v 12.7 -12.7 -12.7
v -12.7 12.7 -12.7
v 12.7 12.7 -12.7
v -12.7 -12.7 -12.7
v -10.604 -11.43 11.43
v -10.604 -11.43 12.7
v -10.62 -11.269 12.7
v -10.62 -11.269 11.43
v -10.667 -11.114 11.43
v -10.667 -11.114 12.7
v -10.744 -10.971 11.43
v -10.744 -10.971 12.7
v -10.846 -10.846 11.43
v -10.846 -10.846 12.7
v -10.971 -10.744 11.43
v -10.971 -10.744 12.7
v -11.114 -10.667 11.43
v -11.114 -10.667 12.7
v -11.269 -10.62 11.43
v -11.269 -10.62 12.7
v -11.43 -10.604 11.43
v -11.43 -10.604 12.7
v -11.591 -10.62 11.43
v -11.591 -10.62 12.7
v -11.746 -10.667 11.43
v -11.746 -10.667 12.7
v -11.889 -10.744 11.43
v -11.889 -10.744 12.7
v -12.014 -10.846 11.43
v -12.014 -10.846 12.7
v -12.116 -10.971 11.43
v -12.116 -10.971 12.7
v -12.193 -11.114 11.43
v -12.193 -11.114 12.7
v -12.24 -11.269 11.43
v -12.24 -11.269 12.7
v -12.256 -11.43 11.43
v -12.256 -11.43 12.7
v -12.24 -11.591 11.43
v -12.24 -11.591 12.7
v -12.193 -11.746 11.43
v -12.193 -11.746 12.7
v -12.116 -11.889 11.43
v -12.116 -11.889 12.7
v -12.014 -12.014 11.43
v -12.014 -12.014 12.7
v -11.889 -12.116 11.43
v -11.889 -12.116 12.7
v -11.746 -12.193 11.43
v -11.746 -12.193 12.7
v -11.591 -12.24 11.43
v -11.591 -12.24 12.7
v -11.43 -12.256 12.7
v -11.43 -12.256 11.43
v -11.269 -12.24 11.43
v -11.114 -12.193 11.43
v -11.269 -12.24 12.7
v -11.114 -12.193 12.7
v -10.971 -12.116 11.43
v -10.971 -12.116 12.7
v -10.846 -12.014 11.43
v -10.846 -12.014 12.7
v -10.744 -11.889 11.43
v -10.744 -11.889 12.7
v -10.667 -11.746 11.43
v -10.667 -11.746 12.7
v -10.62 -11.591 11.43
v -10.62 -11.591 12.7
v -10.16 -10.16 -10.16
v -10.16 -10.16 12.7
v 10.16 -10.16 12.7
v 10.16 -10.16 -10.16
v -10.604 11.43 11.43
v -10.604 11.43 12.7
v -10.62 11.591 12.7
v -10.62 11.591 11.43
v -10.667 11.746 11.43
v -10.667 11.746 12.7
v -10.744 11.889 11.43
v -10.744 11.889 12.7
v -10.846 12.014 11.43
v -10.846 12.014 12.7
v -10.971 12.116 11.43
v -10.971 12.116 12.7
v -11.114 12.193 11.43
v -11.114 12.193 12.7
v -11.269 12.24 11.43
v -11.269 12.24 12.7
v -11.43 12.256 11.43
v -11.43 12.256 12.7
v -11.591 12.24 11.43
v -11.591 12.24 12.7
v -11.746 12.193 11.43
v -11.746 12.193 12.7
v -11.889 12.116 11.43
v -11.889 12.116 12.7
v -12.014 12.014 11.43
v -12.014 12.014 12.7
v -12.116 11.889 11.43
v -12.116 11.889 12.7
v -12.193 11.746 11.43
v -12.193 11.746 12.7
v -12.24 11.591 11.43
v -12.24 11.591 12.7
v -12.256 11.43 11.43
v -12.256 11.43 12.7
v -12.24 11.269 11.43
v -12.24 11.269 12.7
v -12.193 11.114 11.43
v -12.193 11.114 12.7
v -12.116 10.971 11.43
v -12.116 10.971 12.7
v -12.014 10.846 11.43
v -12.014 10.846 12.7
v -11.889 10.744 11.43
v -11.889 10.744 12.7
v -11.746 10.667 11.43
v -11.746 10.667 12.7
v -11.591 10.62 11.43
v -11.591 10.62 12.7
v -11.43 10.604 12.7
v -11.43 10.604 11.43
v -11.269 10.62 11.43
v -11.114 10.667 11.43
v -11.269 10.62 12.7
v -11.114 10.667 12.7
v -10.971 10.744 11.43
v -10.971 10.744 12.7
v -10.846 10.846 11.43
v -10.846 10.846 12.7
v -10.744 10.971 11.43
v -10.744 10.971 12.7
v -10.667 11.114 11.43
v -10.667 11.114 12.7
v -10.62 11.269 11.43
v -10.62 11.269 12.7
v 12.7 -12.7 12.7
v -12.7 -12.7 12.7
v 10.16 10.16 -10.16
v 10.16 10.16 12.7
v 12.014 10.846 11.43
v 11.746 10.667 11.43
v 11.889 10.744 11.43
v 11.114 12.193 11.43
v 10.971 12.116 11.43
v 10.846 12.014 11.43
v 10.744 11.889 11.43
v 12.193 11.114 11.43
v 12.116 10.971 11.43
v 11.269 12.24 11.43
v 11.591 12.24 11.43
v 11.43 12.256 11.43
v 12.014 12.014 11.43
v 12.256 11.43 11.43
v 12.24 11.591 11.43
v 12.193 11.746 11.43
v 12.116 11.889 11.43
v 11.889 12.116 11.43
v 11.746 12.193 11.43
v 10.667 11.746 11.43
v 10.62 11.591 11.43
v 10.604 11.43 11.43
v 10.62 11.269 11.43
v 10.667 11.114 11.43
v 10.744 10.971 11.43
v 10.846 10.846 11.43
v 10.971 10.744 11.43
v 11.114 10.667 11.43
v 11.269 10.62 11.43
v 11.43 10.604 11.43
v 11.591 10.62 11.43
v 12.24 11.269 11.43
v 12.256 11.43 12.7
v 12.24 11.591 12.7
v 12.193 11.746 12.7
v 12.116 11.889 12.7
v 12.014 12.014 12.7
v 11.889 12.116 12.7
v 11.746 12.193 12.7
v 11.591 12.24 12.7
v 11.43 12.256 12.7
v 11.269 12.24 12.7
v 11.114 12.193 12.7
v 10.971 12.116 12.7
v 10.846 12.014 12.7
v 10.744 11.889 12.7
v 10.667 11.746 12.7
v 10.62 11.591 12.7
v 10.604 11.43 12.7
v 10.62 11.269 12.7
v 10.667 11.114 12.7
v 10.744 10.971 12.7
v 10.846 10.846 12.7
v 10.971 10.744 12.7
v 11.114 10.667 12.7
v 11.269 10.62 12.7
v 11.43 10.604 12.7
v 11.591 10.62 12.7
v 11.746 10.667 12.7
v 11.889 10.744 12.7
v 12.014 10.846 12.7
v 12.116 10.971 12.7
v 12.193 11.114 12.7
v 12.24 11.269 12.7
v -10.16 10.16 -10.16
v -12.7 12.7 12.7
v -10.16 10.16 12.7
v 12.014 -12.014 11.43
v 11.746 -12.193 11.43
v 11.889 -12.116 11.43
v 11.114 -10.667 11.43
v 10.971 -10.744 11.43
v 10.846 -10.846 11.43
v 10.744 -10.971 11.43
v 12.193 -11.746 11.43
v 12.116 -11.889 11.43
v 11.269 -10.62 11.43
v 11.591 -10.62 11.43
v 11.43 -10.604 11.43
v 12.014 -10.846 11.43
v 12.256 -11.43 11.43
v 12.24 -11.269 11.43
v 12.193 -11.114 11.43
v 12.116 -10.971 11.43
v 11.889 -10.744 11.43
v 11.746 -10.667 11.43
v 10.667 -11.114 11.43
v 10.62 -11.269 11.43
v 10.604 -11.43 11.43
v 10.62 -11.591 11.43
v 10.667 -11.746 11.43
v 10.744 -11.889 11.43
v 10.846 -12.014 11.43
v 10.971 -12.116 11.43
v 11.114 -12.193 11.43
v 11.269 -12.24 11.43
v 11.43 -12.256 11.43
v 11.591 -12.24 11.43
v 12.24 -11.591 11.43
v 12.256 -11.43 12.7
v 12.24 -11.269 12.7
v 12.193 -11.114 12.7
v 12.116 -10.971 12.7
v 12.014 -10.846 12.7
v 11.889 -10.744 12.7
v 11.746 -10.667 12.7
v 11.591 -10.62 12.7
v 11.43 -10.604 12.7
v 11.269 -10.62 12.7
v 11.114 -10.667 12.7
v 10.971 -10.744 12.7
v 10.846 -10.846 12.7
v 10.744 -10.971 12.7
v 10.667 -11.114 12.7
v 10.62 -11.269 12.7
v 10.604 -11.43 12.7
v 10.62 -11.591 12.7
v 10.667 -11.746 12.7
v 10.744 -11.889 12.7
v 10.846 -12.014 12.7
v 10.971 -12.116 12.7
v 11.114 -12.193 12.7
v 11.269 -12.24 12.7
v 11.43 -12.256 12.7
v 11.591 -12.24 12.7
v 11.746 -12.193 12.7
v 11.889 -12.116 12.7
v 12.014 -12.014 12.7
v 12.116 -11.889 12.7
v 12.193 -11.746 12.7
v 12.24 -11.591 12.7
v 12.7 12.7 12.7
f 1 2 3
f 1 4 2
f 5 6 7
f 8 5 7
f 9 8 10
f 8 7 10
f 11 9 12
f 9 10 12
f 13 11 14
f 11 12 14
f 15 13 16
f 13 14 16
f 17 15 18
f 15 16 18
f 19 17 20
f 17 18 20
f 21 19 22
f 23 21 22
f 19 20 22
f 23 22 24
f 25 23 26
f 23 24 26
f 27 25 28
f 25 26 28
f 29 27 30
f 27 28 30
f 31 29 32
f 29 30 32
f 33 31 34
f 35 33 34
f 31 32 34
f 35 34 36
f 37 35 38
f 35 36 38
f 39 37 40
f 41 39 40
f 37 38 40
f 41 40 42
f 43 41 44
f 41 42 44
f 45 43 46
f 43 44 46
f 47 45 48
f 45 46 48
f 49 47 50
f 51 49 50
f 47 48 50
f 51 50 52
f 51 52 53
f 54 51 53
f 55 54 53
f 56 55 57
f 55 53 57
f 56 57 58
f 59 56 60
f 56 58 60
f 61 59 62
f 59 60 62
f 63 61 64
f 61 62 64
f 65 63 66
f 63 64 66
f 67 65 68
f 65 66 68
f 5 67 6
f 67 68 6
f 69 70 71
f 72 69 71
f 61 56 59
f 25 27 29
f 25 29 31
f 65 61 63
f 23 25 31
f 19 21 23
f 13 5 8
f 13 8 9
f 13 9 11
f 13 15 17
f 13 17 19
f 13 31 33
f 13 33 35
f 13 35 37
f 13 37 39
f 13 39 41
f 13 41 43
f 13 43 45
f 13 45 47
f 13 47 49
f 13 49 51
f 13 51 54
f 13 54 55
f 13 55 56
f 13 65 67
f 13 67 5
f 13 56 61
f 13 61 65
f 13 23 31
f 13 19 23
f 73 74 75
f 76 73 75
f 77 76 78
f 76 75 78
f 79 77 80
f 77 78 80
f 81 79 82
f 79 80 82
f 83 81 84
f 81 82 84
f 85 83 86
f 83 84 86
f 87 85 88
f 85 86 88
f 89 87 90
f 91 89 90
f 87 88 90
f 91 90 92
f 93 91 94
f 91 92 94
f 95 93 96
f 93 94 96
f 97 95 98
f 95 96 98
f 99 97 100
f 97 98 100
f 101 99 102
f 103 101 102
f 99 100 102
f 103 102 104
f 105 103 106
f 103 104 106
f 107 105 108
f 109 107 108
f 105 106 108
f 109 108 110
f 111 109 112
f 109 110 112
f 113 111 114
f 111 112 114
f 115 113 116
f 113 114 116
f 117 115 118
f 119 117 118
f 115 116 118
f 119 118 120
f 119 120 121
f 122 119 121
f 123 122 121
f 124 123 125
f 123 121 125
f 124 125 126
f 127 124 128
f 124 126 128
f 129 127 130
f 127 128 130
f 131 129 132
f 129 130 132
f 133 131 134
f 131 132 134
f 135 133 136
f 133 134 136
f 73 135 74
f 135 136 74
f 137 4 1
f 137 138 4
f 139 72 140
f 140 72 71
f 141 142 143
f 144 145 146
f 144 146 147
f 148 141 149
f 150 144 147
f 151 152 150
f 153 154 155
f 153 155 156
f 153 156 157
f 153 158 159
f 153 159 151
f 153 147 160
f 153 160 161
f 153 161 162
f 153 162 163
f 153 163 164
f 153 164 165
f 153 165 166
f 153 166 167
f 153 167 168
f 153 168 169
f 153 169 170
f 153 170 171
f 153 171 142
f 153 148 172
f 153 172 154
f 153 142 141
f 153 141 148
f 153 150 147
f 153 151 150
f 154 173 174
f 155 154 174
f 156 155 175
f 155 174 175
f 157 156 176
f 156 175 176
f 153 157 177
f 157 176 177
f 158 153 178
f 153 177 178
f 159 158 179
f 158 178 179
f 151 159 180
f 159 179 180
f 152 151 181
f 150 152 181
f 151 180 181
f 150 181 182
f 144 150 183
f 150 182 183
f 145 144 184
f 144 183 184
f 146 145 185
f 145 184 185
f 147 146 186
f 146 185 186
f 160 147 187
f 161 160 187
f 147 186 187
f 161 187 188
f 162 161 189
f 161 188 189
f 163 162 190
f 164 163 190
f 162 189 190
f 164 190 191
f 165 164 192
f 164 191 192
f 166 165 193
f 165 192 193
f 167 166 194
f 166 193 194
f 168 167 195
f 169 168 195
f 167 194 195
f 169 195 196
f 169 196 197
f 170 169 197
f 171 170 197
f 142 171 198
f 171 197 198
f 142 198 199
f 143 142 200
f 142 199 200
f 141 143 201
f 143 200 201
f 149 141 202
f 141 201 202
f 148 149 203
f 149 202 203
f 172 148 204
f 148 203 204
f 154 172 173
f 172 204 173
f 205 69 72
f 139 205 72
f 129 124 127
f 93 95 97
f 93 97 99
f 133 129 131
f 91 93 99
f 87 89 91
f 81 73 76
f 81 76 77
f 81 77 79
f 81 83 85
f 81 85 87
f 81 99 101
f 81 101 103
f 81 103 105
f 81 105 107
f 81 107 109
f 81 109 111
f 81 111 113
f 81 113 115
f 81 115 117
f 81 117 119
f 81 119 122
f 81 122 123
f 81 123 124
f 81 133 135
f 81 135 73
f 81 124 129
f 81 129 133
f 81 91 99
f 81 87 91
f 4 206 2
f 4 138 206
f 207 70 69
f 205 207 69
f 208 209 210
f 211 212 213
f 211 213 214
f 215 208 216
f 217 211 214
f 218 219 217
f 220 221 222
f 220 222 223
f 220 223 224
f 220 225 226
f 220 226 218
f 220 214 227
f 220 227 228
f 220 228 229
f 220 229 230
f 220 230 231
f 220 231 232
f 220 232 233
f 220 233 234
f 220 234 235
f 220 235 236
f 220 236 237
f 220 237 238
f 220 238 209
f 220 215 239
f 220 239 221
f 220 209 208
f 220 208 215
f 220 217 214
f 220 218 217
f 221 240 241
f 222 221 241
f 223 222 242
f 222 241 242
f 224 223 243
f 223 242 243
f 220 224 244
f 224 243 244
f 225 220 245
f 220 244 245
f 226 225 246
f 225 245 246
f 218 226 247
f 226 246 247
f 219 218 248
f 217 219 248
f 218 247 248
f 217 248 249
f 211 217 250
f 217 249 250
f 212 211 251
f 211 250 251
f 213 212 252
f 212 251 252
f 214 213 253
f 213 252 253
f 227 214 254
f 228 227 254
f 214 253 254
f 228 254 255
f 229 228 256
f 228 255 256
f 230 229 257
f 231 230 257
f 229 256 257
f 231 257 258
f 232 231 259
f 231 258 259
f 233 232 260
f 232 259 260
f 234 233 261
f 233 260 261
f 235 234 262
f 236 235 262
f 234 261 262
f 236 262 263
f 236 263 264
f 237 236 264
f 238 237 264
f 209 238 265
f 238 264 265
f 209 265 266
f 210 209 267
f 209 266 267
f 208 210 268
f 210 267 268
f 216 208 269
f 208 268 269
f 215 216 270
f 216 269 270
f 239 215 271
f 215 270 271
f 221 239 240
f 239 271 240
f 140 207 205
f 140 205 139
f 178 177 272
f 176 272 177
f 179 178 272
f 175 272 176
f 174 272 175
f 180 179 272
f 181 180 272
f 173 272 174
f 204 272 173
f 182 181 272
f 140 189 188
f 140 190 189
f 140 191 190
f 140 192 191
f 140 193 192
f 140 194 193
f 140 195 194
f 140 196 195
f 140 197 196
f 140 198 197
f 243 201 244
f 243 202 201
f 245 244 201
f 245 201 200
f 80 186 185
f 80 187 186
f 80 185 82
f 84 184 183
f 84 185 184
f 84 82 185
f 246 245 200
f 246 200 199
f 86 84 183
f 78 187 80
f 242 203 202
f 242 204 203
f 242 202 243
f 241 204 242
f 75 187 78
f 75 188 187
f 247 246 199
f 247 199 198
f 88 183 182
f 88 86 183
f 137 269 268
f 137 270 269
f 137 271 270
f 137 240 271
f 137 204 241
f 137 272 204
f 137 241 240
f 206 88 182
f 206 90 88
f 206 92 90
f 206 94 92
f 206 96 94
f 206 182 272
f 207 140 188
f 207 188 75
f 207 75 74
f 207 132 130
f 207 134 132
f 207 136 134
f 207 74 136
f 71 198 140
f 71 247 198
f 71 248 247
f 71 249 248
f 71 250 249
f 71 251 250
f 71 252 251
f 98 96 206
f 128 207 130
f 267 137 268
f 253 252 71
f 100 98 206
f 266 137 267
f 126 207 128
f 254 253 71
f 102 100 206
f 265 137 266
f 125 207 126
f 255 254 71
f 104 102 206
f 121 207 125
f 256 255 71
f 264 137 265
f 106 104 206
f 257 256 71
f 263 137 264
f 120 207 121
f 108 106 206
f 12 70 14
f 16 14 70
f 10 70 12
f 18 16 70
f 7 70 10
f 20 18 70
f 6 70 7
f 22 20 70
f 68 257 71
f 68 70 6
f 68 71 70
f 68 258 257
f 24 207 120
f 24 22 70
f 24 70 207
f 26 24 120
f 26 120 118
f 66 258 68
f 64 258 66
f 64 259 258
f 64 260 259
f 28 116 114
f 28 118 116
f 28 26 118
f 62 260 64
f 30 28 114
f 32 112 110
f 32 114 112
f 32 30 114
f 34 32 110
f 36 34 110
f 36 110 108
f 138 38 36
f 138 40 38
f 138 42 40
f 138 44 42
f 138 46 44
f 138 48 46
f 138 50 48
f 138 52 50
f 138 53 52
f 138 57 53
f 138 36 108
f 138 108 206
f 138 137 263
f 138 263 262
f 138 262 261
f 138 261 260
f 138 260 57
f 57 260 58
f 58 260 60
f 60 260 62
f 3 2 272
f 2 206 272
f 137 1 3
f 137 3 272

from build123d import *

# Parameters (mm, degrees)
F1_DEPTH = 12.7
F2_T     = -2.54
F3_R     = 0.8255
F4_DEPTH = 1.27


with BuildPart() as f1:
    # F0 (on Front) → F1 (new body, symmetric)
    with BuildSketch(Plane.XZ):
        Polygon((-12.7, -12.7), (0, -12.7), (12.7, -12.7), (12.7, 0), (12.7, 12.7), (0, 12.7), (-12.7, 12.7), (-12.7, 0), align=None)
    extrude(amount=F1_DEPTH, both=True)

    # F2
    f2_openings = [f1.faces().sort_by_distance(p)[0] for p in [
        (0, 0, 12.7),
    ]]
    offset(amount=F2_T, openings=f2_openings)

    # F3 (on face) → F4 (cut)
    with BuildSketch(Plane.XY.offset(12.7)):
        with Locations((-11.43, 11.43)):
            Circle(F3_R)
        with Locations((11.43, 11.43)):
            Circle(F3_R)
        with Locations((11.43, -11.43)):
            Circle(F3_R)
        with Locations((-11.43, -11.43)):
            Circle(F3_R)
    extrude(amount=-F4_DEPTH, mode=Mode.SUBTRACT)


solid = f1.part
